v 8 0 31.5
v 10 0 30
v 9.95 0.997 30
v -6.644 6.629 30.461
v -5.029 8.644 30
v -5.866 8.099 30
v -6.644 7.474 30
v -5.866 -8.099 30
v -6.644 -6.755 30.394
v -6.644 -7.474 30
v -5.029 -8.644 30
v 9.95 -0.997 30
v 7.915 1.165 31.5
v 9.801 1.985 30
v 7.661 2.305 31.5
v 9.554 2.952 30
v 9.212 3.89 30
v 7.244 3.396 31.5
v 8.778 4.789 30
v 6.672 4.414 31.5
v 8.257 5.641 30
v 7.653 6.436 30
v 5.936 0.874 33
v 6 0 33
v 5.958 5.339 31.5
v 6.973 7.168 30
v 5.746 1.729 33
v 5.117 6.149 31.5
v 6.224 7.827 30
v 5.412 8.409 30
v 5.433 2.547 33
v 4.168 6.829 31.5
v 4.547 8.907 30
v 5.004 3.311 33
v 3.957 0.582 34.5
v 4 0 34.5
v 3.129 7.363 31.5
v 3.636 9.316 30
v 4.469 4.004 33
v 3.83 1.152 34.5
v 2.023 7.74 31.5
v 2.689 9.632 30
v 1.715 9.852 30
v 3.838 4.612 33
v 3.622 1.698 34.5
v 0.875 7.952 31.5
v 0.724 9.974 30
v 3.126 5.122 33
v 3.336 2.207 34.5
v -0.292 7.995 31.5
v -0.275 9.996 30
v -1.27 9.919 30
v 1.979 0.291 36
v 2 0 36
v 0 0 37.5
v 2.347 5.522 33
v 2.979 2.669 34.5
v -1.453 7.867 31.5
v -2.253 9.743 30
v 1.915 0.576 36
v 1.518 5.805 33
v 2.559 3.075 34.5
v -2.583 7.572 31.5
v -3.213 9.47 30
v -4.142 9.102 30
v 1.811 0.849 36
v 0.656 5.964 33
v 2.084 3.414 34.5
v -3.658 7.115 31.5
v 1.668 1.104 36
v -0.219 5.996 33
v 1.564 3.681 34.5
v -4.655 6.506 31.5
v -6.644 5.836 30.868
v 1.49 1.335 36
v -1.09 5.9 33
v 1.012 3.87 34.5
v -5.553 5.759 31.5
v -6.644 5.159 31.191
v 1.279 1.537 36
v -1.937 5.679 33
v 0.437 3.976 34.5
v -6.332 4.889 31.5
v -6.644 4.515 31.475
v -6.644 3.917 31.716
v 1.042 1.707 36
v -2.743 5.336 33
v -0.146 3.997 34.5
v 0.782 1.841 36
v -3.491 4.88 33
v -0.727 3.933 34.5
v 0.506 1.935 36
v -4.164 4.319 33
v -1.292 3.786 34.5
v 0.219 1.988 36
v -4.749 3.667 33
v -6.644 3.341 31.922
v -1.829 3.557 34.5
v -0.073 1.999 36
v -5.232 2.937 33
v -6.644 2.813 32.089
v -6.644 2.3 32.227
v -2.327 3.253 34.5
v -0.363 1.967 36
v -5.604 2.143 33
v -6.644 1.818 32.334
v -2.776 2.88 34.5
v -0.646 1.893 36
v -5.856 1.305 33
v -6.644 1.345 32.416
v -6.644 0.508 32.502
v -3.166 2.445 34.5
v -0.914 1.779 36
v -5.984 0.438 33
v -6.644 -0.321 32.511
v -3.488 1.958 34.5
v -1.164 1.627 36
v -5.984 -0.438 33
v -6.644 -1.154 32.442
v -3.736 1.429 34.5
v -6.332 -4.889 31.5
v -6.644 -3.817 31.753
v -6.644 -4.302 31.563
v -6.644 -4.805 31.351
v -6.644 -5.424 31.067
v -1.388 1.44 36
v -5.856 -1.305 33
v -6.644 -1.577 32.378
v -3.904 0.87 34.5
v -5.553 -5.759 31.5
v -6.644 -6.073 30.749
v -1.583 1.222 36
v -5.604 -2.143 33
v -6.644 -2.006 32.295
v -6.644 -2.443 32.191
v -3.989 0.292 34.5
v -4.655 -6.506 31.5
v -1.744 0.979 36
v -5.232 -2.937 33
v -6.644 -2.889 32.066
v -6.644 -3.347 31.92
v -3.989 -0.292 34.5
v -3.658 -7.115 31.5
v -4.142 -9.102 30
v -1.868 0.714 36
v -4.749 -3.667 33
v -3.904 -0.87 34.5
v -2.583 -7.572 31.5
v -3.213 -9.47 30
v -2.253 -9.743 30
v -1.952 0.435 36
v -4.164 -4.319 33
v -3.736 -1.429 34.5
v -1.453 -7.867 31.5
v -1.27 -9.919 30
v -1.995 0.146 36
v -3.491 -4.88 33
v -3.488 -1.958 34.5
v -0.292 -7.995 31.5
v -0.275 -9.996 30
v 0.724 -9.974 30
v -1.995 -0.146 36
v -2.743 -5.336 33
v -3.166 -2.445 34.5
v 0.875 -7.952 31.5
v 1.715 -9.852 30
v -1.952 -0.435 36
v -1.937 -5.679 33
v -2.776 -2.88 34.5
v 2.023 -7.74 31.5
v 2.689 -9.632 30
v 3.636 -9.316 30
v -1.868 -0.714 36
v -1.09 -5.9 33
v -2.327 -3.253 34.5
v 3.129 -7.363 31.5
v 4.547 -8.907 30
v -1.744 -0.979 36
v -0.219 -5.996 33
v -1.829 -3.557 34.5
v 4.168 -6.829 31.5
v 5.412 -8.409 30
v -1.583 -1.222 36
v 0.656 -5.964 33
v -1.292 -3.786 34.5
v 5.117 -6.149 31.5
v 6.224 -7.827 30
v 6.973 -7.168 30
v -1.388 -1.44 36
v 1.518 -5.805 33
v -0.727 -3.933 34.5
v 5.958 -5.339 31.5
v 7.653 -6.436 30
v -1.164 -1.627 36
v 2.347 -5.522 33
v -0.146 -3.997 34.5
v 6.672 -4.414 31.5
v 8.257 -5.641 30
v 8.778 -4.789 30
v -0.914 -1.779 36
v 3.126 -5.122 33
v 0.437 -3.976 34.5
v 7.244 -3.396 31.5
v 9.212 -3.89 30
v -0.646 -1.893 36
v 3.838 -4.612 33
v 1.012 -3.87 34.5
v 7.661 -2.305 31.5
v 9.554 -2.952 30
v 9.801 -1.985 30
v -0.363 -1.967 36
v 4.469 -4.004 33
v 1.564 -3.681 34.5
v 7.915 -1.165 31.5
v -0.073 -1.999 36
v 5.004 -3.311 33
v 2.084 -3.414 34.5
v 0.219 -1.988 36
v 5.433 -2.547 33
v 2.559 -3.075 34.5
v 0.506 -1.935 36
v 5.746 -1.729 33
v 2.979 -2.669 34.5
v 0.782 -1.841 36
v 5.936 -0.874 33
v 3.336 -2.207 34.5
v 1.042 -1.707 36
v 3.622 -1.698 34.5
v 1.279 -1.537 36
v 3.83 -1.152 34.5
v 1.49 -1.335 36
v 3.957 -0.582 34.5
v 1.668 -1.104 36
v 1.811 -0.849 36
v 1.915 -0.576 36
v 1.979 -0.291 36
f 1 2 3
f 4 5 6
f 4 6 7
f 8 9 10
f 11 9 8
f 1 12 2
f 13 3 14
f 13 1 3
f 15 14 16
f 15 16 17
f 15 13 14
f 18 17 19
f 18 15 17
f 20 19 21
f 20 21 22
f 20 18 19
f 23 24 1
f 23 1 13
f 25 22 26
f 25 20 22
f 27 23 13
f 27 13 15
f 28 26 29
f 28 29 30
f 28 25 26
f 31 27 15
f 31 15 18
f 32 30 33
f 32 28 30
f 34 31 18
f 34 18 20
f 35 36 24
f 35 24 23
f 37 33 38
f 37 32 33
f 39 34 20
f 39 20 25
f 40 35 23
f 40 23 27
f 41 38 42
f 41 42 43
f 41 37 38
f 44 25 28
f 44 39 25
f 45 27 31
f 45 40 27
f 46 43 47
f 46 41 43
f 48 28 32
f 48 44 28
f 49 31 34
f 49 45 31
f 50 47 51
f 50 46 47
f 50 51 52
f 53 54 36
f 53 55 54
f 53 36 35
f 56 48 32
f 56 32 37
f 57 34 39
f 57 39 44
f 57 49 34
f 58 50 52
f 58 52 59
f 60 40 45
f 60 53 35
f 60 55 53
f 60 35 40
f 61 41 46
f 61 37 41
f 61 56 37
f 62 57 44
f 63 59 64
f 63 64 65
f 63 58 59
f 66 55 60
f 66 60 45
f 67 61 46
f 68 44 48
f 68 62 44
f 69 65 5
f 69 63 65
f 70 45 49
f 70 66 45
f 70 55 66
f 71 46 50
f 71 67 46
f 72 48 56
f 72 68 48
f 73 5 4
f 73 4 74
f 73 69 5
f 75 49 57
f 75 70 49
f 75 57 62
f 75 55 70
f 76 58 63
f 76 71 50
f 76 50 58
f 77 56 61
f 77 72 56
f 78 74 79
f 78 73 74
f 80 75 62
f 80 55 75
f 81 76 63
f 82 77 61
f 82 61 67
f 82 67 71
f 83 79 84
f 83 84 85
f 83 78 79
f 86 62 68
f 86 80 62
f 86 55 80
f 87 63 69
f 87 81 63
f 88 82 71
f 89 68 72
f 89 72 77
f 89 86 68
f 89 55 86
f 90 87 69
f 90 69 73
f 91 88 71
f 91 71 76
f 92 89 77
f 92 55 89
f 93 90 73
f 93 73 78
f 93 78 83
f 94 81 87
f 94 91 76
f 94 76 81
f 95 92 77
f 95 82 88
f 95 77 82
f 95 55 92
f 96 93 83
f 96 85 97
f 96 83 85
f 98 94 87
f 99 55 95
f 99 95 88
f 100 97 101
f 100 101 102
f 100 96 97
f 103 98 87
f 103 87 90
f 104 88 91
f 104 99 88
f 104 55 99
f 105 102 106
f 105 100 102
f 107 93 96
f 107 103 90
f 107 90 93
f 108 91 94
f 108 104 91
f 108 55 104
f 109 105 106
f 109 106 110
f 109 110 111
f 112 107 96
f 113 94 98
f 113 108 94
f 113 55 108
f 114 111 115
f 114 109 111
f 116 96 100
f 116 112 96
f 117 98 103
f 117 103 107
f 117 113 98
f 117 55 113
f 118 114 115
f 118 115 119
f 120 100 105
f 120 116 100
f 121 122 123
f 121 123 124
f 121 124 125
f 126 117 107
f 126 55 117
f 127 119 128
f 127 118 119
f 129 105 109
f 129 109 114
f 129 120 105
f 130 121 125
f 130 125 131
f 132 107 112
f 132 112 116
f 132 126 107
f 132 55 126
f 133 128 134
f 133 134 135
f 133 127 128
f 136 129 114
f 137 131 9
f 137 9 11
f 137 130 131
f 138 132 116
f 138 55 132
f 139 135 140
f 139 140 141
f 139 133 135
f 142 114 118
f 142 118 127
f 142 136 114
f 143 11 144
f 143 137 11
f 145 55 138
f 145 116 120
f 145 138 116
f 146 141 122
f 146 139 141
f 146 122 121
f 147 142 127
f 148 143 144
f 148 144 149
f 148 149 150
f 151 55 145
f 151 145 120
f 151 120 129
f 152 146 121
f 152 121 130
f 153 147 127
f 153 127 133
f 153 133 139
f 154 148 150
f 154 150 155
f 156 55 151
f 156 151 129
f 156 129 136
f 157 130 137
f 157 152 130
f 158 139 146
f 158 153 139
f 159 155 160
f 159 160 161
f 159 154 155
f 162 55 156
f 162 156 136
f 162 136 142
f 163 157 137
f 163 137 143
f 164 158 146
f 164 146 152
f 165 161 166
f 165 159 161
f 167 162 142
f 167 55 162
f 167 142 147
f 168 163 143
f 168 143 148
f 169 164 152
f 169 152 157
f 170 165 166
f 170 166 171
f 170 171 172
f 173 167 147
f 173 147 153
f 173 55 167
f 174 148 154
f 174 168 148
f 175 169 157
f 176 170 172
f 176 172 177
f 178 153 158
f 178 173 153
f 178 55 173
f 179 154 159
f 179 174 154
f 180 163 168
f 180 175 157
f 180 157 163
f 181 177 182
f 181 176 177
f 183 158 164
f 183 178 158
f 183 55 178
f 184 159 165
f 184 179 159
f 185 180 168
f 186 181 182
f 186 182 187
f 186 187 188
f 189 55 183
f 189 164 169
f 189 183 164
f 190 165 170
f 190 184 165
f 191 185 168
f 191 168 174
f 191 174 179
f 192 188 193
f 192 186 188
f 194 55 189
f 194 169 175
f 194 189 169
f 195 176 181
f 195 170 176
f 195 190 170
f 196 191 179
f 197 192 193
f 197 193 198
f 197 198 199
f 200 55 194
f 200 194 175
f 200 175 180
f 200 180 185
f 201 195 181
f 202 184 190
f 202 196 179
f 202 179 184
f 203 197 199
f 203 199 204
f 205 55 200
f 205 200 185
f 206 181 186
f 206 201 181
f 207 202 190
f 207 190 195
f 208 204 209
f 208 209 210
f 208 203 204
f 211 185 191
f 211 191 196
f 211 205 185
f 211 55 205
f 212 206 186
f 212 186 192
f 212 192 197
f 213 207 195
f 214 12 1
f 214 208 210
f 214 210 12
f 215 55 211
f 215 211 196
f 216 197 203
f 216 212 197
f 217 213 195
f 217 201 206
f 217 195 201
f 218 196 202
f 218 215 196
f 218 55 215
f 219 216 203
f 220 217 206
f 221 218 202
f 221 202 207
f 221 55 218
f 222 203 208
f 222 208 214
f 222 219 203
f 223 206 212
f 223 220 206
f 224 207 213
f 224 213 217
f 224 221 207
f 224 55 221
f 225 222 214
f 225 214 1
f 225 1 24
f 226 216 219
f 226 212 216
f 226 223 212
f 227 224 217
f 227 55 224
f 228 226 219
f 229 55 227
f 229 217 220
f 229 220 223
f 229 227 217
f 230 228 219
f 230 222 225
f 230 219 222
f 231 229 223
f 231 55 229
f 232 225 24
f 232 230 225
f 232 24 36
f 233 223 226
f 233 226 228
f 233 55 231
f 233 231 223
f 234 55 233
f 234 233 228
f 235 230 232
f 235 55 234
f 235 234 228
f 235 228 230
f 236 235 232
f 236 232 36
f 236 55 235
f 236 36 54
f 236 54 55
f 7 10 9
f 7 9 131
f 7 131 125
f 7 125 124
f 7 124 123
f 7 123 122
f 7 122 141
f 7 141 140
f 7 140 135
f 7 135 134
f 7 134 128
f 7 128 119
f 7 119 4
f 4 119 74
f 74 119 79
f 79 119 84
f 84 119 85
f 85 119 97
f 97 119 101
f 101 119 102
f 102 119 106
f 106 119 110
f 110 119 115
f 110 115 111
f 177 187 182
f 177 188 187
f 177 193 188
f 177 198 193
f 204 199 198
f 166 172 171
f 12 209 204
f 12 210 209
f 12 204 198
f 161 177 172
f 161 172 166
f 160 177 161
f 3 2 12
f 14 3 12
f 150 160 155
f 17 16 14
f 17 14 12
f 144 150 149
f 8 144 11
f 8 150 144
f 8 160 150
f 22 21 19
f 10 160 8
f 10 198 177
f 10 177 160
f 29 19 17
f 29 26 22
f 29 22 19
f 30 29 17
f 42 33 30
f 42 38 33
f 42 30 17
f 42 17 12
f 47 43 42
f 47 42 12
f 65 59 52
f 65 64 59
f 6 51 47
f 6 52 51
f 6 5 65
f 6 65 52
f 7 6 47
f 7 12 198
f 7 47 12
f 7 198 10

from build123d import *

# Parameters (mm, degrees)
F3_DEPTH       = 5
F3_DEPTH_BACK  = 50
F4_DEPTH       = 30
F7_DEPTH       = 5
F7_DEPTH_BACK  = 5
F10_DEPTH      = 5
F10_DEPTH_BACK = 5
F12_DEPTH      = 20


# Not quite as in the source:
# - a feature names something its author has since deleted; it is built from what else it names


with BuildPart() as f1:
    # F0 (on Front) → F1 (revolve)
    with BuildSketch(Plane.XZ):
        Polygon((0, 37.5), (0, 30), (10, 30), align=None)
    revolve(axis=Axis((0, 0, 33.75), (0, 0, 1)))

    # F2 (on Top) → F3 (cut, two sides)
    with BuildSketch(Plane.XY) as f3_sk:
        with BuildLine():
            Line((-6.644110661, 4.455984013), (-6.644110661, 7.4998452328))
            Line((-6.644110661, 7.4998452328), (-11.5474741906, 7.4998452328))
            Line((-11.5474741906, 7.4998452328), (-11.5474741906, -9.0728485957))
            Line((-11.5474741906, -9.0728485957), (-6.644110661, -9.0728485957))
            Line((-6.644110661, -9.0728485957), (-6.644110661, -4.455984013))
            ThreePointArc((-6.644110661, -4.455984013), (-8, 0), (-6.644110661, 4.455984013))
        make_face()
        with BuildLine():
            Line((-6.644110661, -4.455984013), (-6.644110661, 4.455984013))
            ThreePointArc((-6.644110661, 4.455984013), (-8, 0), (-6.644110661, -4.455984013))
        make_face()
    extrude(amount=-F3_DEPTH, mode=Mode.SUBTRACT)
    extrude(f3_sk.sketch, amount=F3_DEPTH_BACK, mode=Mode.SUBTRACT)

    # F2 (on Top) → F4 (cut)
    with BuildSketch(Plane.XY):
        with BuildLine():
            ThreePointArc((8, 0), (2.3288532277, 7.6535248509), (-6.644110661, 4.455984013))
            Line((-6.644110661, 4.455984013), (-6.644110661, -4.455984013))
            ThreePointArc((-6.644110661, -4.455984013), (2.3288532277, -7.6535248509), (8, 0))
        make_face()
    extrude(amount=F4_DEPTH, mode=Mode.SUBTRACT)

    # F6 (on line) → F7 (cut, two sides)
    with BuildSketch(Plane(origin=(3.1843009926, -8.1633897791, 0), x_dir=(-0.9316321862, -0.3634026275, 0), z_dir=(-0.3634026275, 0.9316321862, 0))) as f7_sk:
        with BuildLine():
            ThreePointArc((0, 28), (-4.026334039, 15), (0, 2))
            ThreePointArc((0, 2), (4.026334039, 15), (0, 28))
        make_face()
    extrude(amount=F7_DEPTH, mode=Mode.SUBTRACT)
    extrude(f7_sk.sketch, amount=-F7_DEPTH_BACK, mode=Mode.SUBTRACT)

    # F9 (on line) → F10 (cut, two sides)
    with BuildSketch(Plane(origin=(3.1843009926, 8.1633897791, 0), x_dir=(0.9316321862, -0.3634026275, 0), z_dir=(-0.3634026275, -0.9316321862, 0))) as f10_sk:
        with BuildLine():
            ThreePointArc((0, 28), (-4.026334039, 15), (0, 2))
            ThreePointArc((0, 2), (4.026334039, 15), (0, 28))
        make_face()
    extrude(amount=-F10_DEPTH, mode=Mode.SUBTRACT)
    extrude(f10_sk.sketch, amount=F10_DEPTH_BACK, mode=Mode.SUBTRACT)

    # F11 (on Right) → F12 (cut)
    with BuildSketch(Plane.YZ):
        with BuildLine():
            ThreePointArc((0, 28), (-4.026334039, 15), (0, 2))
            ThreePointArc((0, 2), (4.026334039, 15), (0, 28))
        make_face()
    extrude(amount=F12_DEPTH, mode=Mode.SUBTRACT)


solid = f1.part
